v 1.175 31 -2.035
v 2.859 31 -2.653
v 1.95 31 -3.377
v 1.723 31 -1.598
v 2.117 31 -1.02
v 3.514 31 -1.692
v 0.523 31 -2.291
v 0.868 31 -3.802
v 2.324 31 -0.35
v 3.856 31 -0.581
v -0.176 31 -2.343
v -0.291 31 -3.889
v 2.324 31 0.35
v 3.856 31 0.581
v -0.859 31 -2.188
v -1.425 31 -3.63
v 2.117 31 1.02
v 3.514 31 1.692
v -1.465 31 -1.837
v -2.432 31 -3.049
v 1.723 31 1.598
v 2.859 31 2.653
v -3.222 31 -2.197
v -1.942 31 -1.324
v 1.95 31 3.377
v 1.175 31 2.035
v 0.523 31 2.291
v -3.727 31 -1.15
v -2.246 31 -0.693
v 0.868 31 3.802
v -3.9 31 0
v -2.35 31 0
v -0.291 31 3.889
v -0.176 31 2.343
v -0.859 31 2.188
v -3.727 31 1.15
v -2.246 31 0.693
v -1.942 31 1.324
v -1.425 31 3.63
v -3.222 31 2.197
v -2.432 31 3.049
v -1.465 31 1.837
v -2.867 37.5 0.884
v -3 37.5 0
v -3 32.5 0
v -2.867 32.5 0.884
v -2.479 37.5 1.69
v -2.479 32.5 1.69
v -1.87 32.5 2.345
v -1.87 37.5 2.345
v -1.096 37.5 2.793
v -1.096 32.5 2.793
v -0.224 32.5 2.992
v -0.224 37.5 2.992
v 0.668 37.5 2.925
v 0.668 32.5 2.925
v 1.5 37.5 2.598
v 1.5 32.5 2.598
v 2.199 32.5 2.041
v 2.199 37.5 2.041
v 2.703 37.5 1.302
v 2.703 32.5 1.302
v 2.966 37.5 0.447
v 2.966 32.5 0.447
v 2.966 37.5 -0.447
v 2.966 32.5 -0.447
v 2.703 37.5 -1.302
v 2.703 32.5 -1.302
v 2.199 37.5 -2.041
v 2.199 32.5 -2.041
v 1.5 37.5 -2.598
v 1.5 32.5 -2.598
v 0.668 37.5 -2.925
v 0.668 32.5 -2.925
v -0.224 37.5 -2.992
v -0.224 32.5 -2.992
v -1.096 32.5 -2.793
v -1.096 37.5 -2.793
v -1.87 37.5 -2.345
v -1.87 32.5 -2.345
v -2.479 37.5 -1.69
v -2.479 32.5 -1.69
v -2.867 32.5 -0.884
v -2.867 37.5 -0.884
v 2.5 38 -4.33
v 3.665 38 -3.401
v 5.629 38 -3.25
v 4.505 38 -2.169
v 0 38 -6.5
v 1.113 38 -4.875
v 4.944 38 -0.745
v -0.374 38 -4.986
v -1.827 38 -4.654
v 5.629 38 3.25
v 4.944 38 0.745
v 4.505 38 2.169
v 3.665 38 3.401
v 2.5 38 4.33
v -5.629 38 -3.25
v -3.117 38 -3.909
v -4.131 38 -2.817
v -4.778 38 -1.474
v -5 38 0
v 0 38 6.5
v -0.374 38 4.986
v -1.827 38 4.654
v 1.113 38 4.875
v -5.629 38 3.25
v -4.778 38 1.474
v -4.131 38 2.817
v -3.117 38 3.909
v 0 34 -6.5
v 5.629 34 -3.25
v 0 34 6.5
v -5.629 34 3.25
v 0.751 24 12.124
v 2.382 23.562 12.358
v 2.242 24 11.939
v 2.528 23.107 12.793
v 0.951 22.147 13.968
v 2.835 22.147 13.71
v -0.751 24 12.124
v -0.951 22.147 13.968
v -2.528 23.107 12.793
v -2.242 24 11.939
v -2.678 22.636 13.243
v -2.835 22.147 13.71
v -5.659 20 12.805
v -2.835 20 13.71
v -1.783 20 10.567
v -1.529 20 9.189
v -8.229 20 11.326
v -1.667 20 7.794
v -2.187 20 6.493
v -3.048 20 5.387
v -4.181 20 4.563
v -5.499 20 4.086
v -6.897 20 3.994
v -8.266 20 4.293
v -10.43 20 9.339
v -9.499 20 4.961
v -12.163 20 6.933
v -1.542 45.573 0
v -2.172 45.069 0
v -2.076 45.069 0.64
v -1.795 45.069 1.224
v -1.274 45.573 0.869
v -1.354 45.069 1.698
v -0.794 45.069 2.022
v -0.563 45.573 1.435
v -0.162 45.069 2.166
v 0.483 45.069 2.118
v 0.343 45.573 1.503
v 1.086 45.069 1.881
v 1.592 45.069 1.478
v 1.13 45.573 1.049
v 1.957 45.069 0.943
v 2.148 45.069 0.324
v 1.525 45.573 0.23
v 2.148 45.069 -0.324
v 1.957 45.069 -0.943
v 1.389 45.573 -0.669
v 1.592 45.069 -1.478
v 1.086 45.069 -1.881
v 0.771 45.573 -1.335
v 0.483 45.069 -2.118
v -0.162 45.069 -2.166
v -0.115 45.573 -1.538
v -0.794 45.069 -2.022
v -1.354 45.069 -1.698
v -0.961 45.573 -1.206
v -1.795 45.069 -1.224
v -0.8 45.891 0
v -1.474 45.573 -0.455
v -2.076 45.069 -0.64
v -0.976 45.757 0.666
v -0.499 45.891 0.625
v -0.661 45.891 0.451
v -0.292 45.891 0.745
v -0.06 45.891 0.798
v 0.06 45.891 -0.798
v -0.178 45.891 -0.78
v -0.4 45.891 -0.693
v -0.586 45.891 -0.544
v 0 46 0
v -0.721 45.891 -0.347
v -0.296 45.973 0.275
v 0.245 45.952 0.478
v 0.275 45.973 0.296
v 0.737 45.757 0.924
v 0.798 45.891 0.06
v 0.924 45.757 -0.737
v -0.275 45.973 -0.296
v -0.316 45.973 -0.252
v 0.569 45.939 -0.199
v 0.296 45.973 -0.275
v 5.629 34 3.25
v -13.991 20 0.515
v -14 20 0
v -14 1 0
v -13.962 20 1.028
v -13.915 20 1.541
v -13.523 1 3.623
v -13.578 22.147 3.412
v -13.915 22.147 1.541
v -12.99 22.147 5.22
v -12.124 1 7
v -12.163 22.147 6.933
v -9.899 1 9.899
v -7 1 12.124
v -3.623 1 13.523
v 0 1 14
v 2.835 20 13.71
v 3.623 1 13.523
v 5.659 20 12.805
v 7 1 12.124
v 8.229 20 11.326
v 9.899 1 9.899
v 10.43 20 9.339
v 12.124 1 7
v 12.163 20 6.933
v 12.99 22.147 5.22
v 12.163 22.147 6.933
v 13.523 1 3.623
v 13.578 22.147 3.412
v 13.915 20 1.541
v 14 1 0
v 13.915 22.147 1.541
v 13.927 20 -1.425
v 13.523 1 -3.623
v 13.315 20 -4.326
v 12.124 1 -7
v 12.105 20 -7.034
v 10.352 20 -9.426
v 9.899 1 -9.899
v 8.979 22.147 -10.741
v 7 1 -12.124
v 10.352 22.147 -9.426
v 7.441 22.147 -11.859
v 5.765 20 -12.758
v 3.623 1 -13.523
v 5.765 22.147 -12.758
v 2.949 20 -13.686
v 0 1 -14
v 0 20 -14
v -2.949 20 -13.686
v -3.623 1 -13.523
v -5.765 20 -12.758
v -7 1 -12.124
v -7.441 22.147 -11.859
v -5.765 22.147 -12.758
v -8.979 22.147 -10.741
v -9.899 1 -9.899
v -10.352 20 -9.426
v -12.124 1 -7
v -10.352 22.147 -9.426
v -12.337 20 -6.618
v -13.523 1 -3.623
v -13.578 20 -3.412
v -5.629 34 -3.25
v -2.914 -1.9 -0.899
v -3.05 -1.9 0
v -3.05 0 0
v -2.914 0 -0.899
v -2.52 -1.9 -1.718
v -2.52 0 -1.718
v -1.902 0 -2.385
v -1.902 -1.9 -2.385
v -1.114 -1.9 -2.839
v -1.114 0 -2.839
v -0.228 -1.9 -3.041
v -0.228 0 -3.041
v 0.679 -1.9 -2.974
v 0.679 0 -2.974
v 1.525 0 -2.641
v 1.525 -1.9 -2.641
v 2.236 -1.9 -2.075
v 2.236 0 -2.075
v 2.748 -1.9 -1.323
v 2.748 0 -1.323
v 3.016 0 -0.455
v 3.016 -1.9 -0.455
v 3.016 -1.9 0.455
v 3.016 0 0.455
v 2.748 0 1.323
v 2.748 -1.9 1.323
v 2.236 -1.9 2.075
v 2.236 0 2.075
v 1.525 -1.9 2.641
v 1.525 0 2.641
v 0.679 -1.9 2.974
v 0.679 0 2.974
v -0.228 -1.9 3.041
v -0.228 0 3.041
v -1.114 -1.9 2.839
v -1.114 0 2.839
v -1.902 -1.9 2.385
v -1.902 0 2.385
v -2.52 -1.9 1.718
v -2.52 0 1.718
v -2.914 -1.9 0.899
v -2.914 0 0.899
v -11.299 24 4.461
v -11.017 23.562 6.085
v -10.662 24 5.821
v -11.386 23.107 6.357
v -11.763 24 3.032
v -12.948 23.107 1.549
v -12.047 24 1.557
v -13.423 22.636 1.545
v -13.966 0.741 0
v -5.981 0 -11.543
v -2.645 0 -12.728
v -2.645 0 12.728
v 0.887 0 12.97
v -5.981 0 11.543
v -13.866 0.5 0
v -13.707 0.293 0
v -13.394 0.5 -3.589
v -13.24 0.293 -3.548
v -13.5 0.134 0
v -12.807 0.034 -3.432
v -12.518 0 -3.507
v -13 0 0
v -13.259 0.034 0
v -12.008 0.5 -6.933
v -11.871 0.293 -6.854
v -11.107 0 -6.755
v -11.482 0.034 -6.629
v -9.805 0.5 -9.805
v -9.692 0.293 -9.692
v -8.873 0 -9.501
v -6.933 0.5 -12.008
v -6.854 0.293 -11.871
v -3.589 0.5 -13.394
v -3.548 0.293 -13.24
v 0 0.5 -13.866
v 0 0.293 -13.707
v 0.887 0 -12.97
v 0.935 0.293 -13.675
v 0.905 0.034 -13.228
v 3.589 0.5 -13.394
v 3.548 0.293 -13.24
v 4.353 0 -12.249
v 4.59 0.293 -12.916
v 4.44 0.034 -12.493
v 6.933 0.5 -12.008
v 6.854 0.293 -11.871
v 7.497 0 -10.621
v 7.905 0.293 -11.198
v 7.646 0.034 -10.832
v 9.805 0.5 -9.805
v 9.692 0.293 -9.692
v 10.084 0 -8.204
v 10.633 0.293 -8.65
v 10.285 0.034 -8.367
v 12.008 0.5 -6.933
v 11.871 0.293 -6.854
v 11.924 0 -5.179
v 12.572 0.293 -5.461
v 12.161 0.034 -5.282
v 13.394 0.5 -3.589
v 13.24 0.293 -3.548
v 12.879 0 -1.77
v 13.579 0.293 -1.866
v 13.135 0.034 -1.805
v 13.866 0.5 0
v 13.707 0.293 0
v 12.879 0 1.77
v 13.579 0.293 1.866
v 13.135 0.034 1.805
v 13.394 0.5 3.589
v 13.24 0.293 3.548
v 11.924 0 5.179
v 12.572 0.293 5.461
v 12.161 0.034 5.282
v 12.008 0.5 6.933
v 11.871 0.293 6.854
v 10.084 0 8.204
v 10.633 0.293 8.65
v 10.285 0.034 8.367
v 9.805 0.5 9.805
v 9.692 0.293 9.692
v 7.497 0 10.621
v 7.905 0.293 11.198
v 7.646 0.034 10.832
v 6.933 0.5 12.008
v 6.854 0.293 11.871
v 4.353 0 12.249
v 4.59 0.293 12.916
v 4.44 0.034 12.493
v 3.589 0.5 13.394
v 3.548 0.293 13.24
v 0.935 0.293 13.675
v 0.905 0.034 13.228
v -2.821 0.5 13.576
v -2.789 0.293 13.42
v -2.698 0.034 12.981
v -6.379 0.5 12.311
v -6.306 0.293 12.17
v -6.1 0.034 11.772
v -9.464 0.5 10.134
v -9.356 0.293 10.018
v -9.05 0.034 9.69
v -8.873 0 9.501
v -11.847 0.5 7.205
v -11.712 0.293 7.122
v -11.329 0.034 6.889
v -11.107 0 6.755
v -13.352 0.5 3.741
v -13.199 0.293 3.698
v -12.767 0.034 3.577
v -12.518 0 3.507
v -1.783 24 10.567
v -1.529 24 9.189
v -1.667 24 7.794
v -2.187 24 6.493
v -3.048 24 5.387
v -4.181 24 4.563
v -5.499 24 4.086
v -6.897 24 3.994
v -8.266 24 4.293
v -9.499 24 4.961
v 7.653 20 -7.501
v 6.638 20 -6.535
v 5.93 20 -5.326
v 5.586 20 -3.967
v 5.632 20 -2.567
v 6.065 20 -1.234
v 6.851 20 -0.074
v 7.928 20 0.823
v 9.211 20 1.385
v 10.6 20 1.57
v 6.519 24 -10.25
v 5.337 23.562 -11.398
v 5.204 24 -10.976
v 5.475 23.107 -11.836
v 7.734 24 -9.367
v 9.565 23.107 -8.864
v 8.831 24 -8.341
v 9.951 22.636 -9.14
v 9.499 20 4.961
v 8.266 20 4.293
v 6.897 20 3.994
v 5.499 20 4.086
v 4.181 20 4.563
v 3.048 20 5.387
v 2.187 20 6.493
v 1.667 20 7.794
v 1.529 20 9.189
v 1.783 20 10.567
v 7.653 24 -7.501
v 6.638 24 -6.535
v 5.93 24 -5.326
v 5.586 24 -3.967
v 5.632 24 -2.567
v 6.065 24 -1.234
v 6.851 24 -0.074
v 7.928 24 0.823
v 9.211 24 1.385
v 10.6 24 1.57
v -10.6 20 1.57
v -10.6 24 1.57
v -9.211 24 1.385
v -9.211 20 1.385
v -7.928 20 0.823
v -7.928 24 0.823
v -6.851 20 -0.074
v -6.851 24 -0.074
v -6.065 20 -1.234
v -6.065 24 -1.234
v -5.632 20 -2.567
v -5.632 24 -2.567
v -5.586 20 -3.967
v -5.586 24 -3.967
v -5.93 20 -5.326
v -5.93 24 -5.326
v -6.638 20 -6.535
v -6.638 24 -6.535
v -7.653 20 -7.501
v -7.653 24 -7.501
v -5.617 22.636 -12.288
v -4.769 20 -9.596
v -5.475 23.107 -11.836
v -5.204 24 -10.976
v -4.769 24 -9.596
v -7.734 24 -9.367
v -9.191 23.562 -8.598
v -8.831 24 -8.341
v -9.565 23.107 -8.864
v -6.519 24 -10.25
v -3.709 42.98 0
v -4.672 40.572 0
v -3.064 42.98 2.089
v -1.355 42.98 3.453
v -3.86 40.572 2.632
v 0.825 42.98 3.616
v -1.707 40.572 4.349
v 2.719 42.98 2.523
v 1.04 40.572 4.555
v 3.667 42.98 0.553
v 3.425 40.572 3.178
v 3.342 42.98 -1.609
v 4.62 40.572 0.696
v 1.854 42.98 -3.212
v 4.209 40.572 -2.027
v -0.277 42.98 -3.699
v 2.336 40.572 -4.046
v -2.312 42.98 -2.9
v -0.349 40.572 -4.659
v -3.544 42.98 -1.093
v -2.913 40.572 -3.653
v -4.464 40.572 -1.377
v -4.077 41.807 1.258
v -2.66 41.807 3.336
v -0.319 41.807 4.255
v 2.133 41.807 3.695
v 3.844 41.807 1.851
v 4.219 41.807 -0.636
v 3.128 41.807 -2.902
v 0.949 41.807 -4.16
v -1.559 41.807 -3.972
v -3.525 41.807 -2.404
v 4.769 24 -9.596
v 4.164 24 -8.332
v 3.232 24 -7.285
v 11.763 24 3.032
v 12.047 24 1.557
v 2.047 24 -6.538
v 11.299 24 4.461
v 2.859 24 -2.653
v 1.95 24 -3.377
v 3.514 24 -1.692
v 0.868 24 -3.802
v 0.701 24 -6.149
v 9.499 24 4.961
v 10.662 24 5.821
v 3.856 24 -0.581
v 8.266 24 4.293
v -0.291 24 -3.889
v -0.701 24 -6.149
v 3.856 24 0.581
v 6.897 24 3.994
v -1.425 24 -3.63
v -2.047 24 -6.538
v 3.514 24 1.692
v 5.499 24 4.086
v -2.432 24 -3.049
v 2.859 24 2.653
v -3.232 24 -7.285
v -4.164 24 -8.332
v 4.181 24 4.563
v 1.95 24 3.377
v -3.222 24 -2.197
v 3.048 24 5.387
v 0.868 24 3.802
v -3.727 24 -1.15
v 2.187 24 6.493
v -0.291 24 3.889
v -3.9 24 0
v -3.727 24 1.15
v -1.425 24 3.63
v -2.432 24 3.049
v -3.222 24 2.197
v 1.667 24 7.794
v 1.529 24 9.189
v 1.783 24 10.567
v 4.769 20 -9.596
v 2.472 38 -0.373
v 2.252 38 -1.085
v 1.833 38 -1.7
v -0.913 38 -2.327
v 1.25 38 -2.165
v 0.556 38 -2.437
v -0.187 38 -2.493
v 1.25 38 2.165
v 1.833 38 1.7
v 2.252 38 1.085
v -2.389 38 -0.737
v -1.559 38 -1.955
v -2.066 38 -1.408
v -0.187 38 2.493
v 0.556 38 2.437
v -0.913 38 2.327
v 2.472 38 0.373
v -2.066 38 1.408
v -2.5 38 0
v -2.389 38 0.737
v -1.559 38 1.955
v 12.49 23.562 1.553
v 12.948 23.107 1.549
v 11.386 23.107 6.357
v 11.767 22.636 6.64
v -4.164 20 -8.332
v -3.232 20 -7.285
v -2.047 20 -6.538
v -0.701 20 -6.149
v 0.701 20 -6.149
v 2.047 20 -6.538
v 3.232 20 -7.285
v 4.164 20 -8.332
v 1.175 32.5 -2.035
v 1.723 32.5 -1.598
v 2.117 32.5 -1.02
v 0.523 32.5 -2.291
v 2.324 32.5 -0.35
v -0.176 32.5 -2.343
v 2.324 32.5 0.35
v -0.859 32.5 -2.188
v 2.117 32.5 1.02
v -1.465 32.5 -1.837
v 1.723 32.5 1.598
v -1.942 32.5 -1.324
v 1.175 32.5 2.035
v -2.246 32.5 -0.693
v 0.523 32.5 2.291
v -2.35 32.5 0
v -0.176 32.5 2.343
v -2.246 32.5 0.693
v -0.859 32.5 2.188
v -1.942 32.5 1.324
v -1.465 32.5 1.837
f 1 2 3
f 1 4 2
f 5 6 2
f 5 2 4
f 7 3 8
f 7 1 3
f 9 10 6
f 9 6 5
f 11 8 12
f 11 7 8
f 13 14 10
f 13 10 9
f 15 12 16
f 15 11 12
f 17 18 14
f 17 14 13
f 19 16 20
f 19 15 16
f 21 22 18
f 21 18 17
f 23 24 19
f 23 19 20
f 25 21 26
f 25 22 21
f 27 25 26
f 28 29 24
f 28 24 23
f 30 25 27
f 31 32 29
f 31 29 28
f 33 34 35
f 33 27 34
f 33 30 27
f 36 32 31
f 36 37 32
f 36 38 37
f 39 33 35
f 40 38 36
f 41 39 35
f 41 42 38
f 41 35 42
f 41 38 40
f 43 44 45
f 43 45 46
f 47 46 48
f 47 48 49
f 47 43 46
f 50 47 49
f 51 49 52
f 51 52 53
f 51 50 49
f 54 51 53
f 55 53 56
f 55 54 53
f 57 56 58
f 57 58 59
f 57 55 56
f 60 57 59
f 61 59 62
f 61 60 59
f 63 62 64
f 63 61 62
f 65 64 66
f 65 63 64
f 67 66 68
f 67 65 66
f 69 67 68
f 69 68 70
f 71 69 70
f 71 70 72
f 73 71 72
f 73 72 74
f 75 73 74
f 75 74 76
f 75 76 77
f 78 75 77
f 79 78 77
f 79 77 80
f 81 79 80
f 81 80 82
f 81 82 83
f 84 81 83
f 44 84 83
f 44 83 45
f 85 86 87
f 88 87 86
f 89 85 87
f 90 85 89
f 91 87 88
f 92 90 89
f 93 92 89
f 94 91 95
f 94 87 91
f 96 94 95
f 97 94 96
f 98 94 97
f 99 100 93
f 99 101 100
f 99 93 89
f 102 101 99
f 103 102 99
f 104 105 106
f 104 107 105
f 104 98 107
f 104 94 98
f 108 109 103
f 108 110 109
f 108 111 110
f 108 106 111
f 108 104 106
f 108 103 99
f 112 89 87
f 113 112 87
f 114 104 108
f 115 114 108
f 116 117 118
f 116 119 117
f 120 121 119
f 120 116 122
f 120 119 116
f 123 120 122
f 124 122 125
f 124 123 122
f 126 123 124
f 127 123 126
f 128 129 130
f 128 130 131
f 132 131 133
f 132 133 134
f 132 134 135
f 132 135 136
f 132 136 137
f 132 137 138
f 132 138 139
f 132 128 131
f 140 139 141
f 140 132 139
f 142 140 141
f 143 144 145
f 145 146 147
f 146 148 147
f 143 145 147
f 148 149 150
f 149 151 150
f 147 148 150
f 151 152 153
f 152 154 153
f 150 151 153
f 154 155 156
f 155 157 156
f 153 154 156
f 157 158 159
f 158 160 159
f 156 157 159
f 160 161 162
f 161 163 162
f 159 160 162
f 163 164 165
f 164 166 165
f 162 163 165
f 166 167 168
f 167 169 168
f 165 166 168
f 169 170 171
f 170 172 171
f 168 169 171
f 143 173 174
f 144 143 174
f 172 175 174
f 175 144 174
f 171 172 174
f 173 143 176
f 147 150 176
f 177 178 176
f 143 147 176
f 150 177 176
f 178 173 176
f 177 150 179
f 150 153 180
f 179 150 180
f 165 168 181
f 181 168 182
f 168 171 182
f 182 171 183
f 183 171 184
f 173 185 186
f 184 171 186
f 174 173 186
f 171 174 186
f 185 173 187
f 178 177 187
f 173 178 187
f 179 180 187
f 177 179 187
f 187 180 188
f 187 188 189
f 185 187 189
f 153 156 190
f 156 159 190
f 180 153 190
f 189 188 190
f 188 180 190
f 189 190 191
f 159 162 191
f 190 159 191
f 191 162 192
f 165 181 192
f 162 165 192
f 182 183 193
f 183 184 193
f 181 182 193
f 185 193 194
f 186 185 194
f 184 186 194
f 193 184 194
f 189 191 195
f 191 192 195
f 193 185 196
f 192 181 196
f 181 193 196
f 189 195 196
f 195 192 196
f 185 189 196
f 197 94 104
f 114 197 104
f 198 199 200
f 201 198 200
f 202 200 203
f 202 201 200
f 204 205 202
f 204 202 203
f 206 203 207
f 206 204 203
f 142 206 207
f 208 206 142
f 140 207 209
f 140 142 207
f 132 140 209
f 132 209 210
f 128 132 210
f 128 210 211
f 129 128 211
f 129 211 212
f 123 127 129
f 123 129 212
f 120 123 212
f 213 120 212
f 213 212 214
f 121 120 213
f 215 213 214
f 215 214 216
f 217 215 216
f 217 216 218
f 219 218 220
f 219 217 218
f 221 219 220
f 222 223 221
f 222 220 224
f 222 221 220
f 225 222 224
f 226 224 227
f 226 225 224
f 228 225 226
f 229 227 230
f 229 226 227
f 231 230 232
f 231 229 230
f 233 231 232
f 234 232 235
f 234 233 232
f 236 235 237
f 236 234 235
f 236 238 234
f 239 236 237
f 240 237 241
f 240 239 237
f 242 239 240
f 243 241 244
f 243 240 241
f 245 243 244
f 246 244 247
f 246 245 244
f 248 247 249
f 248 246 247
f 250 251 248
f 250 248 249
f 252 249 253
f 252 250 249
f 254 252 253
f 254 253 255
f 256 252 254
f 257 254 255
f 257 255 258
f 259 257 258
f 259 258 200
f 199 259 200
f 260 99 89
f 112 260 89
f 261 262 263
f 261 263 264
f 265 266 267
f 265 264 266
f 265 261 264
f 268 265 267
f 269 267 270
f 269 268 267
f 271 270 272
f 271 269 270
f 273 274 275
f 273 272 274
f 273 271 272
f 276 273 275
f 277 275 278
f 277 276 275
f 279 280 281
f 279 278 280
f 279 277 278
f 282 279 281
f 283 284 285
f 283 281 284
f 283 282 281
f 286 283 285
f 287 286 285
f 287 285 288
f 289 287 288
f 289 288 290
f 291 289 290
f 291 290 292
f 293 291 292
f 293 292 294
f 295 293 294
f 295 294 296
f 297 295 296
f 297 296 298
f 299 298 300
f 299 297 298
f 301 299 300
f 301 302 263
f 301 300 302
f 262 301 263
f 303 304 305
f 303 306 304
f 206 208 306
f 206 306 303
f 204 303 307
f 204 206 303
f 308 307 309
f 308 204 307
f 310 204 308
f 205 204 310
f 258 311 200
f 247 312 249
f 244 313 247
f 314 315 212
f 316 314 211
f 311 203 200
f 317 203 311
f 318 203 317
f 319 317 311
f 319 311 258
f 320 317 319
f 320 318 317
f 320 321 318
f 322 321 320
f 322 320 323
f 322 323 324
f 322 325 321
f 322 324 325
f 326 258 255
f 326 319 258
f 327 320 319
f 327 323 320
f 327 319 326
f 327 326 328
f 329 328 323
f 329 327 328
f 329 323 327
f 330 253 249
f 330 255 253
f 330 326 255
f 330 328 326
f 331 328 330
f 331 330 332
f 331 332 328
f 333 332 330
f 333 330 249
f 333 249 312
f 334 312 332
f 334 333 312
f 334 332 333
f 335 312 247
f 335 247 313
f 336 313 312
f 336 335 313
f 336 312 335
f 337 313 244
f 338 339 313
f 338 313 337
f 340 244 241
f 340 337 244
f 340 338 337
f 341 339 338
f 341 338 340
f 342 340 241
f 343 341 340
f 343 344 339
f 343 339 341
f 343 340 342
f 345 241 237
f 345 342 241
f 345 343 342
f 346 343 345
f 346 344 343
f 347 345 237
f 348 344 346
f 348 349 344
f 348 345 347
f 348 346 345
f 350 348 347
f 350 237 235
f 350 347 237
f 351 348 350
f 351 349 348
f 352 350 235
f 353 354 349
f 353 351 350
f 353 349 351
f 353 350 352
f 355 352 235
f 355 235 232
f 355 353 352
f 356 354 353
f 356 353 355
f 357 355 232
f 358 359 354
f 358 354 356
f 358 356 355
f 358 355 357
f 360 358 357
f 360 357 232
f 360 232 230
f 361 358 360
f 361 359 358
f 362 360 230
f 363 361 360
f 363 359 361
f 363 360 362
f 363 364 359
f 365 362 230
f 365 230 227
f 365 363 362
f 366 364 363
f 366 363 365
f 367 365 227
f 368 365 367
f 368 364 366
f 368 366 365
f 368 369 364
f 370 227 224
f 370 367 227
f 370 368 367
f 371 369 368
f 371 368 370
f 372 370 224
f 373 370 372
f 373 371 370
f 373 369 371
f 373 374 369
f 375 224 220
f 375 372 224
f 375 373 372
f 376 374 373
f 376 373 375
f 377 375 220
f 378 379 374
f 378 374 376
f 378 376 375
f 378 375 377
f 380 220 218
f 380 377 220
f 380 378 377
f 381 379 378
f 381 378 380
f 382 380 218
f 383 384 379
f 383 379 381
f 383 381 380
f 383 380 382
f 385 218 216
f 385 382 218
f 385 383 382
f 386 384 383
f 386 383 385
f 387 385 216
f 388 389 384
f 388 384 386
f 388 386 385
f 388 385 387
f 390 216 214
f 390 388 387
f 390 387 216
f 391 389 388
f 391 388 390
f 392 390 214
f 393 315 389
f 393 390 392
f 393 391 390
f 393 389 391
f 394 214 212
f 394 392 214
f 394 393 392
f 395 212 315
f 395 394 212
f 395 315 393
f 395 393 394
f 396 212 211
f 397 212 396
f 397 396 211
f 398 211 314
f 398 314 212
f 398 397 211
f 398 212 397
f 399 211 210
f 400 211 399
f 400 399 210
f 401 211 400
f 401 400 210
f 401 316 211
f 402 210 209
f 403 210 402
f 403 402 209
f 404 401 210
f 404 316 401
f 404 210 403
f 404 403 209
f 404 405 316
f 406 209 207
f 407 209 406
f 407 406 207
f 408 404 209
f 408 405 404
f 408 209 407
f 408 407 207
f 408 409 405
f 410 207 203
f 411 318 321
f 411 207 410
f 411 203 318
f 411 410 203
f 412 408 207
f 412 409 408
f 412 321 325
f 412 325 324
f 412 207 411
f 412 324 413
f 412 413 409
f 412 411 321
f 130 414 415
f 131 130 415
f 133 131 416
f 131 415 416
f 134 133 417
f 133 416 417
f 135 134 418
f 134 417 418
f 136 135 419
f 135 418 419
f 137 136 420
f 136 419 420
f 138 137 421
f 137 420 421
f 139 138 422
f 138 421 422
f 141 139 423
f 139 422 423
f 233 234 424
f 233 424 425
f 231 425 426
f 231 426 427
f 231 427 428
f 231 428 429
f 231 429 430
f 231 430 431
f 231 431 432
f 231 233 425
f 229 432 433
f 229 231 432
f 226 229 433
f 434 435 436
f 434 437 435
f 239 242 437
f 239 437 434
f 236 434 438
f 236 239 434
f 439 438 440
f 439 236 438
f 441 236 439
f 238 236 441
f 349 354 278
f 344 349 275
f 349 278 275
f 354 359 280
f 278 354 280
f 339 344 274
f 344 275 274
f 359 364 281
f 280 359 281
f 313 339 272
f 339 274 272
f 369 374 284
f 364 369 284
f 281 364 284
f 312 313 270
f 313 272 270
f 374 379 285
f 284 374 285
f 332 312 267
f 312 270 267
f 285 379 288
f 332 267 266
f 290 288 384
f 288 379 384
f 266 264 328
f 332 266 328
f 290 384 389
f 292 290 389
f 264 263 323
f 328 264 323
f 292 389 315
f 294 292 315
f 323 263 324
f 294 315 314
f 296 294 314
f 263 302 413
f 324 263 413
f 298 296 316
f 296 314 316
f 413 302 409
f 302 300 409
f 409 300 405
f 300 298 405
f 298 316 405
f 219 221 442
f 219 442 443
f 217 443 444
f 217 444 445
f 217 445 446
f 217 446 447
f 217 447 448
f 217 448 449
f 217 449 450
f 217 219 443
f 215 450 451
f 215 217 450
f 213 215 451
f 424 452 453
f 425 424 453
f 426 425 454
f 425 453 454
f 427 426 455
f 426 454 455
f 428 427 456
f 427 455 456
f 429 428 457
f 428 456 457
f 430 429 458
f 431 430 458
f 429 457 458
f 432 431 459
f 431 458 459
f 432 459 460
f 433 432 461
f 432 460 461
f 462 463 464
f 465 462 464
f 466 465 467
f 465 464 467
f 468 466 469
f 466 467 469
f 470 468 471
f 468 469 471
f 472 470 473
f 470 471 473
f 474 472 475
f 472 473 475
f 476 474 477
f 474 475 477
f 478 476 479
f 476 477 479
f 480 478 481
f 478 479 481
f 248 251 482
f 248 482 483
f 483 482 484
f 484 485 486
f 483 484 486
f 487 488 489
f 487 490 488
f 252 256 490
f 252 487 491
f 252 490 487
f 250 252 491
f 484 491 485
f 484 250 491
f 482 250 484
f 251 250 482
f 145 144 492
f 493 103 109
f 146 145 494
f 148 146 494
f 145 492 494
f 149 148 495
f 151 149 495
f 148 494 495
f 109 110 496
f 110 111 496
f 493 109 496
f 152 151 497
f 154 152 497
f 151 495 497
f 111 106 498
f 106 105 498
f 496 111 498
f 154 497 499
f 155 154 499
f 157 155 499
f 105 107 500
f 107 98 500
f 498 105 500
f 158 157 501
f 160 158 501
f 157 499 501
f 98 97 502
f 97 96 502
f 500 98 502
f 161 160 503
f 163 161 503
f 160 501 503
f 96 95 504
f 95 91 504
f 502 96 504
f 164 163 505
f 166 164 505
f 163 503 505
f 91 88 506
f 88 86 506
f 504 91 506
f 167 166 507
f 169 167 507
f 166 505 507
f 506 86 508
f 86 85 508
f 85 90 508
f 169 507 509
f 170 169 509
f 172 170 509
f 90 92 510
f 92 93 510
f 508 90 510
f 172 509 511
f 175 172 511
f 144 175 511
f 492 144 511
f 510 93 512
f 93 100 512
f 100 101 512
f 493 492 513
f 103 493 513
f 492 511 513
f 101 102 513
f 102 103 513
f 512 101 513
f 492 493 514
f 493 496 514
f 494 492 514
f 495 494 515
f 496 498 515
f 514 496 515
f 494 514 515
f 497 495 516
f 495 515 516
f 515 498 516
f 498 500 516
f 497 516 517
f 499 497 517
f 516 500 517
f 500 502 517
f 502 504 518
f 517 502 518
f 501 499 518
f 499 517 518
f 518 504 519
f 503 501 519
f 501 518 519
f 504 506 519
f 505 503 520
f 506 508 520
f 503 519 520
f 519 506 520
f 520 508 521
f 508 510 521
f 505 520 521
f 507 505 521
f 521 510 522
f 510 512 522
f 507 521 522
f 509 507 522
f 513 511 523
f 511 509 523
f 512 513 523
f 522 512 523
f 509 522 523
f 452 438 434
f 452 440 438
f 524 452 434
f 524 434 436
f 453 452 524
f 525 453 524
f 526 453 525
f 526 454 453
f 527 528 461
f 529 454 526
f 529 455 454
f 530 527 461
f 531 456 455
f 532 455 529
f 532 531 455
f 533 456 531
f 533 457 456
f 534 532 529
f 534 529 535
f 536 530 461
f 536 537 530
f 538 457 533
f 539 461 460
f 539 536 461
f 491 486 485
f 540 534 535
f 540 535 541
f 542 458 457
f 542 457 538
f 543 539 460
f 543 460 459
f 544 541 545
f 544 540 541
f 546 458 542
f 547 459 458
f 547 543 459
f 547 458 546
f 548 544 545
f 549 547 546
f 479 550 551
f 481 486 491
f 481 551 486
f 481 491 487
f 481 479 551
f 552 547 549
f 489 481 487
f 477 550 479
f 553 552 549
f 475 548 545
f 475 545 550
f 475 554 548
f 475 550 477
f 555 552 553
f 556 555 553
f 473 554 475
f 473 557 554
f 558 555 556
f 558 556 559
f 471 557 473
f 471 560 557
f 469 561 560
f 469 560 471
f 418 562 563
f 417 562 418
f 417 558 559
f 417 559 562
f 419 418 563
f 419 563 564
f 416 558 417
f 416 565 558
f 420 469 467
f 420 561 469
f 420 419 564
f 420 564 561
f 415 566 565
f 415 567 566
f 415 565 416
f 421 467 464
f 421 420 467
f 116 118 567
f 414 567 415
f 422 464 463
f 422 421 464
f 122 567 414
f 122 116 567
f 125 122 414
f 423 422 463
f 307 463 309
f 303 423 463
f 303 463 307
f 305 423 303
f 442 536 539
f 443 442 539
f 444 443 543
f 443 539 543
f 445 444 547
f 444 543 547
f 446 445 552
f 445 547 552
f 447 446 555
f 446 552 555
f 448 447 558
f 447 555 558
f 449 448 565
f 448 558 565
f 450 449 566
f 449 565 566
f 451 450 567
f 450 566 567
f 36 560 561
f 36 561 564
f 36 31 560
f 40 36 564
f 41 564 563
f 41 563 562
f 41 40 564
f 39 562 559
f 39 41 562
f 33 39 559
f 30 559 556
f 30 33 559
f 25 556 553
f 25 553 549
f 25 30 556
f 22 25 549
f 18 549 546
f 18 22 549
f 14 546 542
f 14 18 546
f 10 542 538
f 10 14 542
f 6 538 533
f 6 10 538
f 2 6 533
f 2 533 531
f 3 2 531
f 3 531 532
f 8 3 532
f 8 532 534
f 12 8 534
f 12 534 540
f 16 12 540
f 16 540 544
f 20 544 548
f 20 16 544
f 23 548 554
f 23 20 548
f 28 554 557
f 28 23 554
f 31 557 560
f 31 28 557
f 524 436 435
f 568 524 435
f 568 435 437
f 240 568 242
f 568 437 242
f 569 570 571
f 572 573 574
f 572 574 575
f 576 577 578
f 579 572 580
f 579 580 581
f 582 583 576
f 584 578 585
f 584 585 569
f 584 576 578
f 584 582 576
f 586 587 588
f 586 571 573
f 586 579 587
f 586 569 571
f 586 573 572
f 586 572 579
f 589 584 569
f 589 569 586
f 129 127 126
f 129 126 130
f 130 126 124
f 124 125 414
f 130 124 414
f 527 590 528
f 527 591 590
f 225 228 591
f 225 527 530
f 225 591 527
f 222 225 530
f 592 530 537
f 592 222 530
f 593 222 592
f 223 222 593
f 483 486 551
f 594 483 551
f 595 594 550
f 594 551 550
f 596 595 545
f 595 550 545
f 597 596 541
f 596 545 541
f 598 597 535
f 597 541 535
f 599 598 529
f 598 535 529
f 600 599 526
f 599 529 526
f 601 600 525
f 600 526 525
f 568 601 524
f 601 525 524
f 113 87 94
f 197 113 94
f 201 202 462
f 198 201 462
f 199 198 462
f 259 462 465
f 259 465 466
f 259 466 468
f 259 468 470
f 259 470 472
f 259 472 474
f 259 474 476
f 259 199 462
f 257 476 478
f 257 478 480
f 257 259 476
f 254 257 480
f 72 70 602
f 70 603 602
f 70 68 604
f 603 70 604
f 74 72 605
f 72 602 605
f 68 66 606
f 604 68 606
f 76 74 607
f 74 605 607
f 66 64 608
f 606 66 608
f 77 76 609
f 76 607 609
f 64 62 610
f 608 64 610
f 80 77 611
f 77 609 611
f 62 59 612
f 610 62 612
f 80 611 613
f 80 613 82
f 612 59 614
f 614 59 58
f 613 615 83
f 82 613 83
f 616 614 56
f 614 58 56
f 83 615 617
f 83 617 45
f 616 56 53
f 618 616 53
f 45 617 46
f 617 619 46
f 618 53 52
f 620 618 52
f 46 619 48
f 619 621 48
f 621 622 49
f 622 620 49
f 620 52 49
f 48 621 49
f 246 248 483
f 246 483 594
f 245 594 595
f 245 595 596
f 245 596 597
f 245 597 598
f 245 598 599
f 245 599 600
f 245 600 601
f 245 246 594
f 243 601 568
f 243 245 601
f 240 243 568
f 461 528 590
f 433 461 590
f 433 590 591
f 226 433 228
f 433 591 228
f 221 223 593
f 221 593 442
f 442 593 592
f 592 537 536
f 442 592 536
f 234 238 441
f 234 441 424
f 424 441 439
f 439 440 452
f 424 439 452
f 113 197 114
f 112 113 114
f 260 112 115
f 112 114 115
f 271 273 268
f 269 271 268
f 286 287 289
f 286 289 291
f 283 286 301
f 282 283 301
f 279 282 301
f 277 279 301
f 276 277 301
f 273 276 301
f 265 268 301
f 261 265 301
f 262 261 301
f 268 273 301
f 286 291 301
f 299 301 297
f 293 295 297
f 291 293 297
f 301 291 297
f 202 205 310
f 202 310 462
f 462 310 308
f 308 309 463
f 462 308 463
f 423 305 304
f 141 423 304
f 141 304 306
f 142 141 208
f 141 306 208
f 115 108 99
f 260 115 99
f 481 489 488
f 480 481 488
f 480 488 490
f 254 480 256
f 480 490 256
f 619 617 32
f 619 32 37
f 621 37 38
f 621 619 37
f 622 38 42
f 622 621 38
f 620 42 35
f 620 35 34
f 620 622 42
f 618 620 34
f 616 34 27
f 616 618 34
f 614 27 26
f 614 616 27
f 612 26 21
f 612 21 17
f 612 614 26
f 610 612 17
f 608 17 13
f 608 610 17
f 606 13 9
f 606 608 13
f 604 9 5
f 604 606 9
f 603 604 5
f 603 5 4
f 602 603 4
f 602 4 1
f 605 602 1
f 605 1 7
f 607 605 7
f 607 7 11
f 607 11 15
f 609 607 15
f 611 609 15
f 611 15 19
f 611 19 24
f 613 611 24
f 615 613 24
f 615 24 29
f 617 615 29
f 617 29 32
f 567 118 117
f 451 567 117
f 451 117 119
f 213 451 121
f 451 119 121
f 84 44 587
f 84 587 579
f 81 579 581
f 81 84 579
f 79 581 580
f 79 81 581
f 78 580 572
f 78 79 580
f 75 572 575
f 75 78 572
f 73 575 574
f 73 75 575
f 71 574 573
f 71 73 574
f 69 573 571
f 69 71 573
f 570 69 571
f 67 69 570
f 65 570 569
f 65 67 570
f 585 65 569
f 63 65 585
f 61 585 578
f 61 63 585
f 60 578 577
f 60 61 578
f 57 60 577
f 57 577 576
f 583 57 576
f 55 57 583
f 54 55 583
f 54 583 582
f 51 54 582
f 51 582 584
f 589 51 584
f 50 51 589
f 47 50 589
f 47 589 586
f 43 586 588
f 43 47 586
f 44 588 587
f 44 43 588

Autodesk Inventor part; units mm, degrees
ref_plane "YZ Plane" through (0, 0, 0) normal (1, 0, 0) x (0, 1, 0)
ref_plane "XZ Plane" through (0, 0, 0) normal (0, 1, 0) x (-1, 0, 0)
ref_plane "XY Plane" through (0, 0, 0) normal (0, 0, 1) x (1, 0, 0)
sketch "Эскиз1" plane through (0, 0, 0) normal (0, 0, 1) x (1, 0, 0)
  line L0 (0, 0) -> (0, 31)
  line L1 (0, 0) -> (-14, 0)
  line L2 (-14, 0) -> (-14, 24)
  line L3 (-14, 24) -> (-3.9, 24)
  line L4 (-3.9, 24) -> (-3.9, 31)
  line L5 (-3.9, 31) -> (0, 31)
  line L6 (-3.05, 0) -> (-3.05, -1.9)
  line L7 (-3.05, -1.9) -> (0, -1.9)
  line L8 (0, -1.9) -> (0, 0)
  line L9 (0, 38) -> (0, 31)
  line L10 (-2.35, 31) -> (-2.35, 32.5)
  line L11 (-2.35, 32.5) -> (-3, 32.5)
  line L12 (-3, 32.5) -> (-3, 38)
  line L13 (-3, 38) -> (0, 38)
  dimension "d0" = 24
  dimension "d1" = 28
  dimension "d2" = 7.8
  dimension "d3" = 7
  dimension "d5" = 6.1
  dimension "d6" = 1.9
  dimension "d20" = 4.7
  dimension "d21" = 6
  dimension "d22" = 7
  dimension "d23" = 1.5
revolve "Вращение1" add sketch "Эскиз1" angle 360 about axis through (0, 0, 0) along (0, 1, 0)
chamfer "Фаска1" distance 1.8526 angle 45 1 edges at (14, 24, 0)
fillet "Сопряжение1" radius 1 1 edges at (14, 0, 0)
sketch "Эскиз2" plane through (0, 24, 0) normal (0, 1, 0) x (1, 0, 0)
  line L0 (-5.7653, 12.7578) -> (-4.7686, 9.5965)
  arc A0 (-4.7686, 9.5965) -> (4.7686, 9.5965) centre (0, 11.1) ccw
  line L1 (4.7686, 9.5965) -> (5.7653, 12.7578)
  circle A1 centre (0, 0) radius 14 projected
  point P0 (0, 0)
  dimension "d11" = 7.9
  dimension "d12" = 35
  dimension "d13" = 5
extrude "Выдавливание1" cut sketch "Эскиз2" against normal blind 4 contours A1 L1 A0 L0 picked at (2.4163, 12.0782)
pattern_circular "Круговой массив1" count 5 over 360 about axis through (0, 12, 0) along (0, 1, 0) of "Выдавливание1"
thread "Резьба1" size "M6x1" class "6g" standard "ISO Metric profile" full length
chamfer "Фаска2" distance 0.5 angle 45 1 edges at (3, 38, 0)
sketch "Эскиз4" plane through (0, 0, 0) normal (0, 0, 1) x (1, 0, 0)
  line L0 (0, 34) -> (-6.5, 34)
  line L1 (-6.5, 34) -> (-6.5, 38)
  line L2 (-6.5, 38) -> (-5, 38)
  arc A0 (-2.1724, 45.069) -> (-5, 38) centre (5.25, 38) ccw
  line L3 (0, 34) -> (0, 46)
  arc A1 (0, 46) -> (-2.1724, 45.069) centre (0, 43) ccw
  point P0 (0, 0)
  dimension "d8" = 2
  dimension "d52" = 4
  dimension "d53" = 10
  dimension "d54" = 3
  dimension "d55" = 13
  dimension "d60" = 12
revolve "Вращение3" add sketch "Эскиз4" angle 360 about axis through (0, 34, 0) along (0, 1, 0) separate body
sketch "Эскиз5" plane through (0, 38, 0) normal (0, 1, 0) x (1, 0, 0)
  circle A0 centre (0, 0) radius 6.5 projected
  circle A1 centre (0, 0) radius 3.05 construction
  line L0 (0, 6.5) -> (5.6292, 3.25)
  line L1 (5.6292, 3.25) -> (5.6292, -3.25)
  line L2 (5.6292, -3.25) -> (0, -6.5)
  line L3 (0, -6.5) -> (-5.6292, -3.25)
  line L4 (-5.6292, -3.25) -> (-5.6292, 3.25)
  line L5 (-5.6292, 3.25) -> (0, 6.5)
  point P0 (-5.6292, 3.25)
  point P1 (-5.6292, 3.25)
  point P2 (-5.6292, -3.25)
  point P3 (-5.6292, -3.25)
  point P4 (0, -6.5)
  point P5 (0, -6.5)
  point P6 (5.6292, -3.25)
  point P7 (5.6292, -3.25)
  point P8 (5.6292, 3.25)
  point P9 (5.6292, 3.25)
extrude "Выдавливание3" cut sketch "Эскиз5" against normal up to surface (4 mm away) contours A0 L1 | L0 A0 | A0 L2 | L5 A0 | A0 L3 | L4 A0 bodies 2
equation "\"d0\" = motor_height"
equation "\"d1\" = motor_diameter"
equation "\"blade_radius\" = 127"
equation "\"bearing_inner\" = 7"
equation "\"bearing_outer\" = 19"
equation "\"bearing_width\" = 6"
equation "\"beam_length\" = 254"
equation "\"motor_height\" = 24"
equation "\"motor_diameter\" = 28"
equation "\"motor_blade_offset\" = 2"
equation "\"M4_nut_lock_width\" = 6.8"
equation "\"M4_screw_innerHex_cap_diam\" = 6.6"
equation "\"M4_screw_innerHex_cap_height\" = 4"
equation "\"M4_nut_lock_height\" = 5"
properties part number "Моторчик"
